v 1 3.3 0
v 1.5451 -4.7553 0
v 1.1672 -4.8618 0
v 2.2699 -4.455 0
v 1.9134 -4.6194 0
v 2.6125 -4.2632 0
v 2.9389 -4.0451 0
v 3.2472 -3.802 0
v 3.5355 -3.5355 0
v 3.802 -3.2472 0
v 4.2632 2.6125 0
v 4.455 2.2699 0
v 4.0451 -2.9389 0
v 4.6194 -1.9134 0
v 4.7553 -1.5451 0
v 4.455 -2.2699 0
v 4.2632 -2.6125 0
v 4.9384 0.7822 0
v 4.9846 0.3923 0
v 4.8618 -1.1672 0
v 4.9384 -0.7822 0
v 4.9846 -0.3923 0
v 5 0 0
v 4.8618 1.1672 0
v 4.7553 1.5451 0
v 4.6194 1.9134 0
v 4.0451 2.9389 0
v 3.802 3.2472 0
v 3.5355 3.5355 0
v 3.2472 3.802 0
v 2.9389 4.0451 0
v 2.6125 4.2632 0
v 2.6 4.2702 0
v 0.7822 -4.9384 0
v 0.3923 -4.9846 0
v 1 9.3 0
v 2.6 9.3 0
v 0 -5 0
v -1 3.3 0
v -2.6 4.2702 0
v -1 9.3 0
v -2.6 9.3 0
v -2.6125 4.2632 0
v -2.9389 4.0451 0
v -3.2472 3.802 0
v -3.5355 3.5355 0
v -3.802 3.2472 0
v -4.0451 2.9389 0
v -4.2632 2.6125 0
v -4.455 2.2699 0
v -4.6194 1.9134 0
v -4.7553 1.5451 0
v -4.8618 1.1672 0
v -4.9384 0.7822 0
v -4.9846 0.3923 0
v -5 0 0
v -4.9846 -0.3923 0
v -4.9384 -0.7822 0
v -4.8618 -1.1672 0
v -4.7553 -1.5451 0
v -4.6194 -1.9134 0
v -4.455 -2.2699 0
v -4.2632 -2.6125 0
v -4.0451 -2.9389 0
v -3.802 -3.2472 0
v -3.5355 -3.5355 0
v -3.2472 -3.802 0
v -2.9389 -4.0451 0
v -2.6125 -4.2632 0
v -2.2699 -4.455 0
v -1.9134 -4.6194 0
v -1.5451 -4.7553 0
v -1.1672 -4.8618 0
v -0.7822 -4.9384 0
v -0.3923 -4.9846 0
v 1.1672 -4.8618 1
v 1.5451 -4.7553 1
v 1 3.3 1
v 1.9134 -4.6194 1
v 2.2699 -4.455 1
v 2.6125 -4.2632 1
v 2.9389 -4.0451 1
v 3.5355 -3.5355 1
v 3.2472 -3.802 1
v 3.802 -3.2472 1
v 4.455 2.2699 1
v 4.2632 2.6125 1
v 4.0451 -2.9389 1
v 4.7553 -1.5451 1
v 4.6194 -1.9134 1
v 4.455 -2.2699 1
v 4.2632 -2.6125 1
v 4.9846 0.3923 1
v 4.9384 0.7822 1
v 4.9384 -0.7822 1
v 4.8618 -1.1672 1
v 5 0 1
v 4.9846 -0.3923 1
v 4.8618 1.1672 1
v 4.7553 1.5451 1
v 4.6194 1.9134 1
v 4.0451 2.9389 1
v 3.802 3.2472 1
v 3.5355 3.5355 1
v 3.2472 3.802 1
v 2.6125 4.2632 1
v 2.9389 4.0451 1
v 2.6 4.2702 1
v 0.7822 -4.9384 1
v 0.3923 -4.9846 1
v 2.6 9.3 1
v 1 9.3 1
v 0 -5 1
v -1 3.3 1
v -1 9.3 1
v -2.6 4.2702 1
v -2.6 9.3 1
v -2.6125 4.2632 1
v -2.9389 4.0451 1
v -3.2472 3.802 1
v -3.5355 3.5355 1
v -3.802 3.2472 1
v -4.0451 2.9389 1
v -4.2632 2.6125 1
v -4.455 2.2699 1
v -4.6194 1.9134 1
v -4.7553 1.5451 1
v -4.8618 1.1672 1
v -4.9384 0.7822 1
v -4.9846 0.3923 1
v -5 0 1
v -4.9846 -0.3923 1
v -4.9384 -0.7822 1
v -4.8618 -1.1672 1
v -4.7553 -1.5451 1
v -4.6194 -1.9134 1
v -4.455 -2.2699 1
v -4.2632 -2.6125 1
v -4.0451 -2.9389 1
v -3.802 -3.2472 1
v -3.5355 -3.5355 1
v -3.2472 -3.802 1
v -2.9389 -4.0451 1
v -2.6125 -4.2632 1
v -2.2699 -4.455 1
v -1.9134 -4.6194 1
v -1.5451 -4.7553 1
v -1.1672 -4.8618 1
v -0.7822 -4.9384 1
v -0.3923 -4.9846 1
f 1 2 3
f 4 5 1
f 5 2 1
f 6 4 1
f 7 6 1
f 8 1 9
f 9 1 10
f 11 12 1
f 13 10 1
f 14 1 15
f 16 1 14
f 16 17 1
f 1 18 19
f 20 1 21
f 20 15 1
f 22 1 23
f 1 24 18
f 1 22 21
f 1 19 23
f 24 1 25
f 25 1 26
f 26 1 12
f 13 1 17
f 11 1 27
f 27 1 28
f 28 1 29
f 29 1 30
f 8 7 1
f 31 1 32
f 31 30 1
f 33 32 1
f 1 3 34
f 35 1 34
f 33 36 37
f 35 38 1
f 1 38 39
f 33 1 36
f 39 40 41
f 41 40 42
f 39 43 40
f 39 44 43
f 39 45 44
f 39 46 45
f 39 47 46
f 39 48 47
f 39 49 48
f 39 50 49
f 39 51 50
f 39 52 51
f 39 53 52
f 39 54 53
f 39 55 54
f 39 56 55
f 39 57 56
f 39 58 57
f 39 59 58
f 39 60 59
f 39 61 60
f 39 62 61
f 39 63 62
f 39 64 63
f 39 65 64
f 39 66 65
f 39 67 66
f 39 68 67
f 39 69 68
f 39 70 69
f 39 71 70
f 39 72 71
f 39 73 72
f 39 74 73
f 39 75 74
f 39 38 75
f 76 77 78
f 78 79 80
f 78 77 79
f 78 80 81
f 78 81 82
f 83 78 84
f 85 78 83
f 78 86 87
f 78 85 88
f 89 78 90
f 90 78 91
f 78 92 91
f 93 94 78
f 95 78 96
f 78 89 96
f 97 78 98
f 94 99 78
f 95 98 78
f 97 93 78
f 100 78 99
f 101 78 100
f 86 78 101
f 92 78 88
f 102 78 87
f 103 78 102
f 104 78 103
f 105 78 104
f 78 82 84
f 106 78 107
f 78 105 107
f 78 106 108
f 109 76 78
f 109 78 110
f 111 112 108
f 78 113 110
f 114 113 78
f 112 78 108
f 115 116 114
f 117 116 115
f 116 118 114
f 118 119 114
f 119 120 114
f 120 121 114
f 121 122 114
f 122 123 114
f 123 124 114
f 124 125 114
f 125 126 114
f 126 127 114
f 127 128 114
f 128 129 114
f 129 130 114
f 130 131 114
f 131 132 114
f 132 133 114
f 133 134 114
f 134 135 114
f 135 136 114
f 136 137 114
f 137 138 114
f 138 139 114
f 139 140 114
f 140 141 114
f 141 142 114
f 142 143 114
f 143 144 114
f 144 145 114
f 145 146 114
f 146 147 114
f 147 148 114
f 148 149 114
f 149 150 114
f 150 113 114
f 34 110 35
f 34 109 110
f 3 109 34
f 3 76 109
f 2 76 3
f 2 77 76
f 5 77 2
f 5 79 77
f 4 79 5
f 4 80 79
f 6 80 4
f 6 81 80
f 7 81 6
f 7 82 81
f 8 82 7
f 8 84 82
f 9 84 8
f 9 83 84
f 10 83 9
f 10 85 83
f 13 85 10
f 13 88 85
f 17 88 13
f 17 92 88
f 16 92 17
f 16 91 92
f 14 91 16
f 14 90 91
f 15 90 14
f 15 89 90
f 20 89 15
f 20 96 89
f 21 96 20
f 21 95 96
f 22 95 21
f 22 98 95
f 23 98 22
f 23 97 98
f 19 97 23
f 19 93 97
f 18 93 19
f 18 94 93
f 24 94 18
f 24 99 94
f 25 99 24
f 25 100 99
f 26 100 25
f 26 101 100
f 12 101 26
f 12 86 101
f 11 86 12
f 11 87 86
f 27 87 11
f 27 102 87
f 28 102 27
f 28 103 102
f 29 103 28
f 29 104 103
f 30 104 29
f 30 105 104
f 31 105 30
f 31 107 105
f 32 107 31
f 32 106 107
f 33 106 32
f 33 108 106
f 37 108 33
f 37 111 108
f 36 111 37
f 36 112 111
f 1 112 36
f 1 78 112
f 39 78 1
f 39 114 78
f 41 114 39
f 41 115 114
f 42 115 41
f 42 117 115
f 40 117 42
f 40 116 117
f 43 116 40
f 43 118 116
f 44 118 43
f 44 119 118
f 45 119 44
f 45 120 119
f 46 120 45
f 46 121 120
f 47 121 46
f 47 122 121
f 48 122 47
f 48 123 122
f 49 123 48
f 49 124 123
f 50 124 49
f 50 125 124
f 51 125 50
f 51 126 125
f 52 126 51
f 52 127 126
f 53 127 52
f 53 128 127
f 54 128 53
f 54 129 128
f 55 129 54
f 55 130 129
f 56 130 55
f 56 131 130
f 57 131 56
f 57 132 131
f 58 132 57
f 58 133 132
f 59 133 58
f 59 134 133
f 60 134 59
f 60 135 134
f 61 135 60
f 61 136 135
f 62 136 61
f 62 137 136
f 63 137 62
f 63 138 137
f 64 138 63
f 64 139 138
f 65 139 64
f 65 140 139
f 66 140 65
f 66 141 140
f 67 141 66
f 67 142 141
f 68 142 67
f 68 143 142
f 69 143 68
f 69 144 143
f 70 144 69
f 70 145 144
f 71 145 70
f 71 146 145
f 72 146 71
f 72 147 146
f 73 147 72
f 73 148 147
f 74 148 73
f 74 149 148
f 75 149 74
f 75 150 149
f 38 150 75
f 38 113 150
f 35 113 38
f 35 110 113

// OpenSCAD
// part_id: cp-f3
// name: Fork 2W 4D 8L 7T
// source_drawing_ids: DRW-005
// units: mm
// revision: 0.1
// SPDX-License-Identifier: MIT

module cpf3_profile_2d() {
    difference() {
        union() {
            circle(r = 5.0, $fn = 80);
            translate([0, 5.3]) square([5.2, 8.0], center = true);
        }
        translate([0, 7.3]) square([2.0, 8.0], center = true);
    }
}

module part_cpf3(th = 1.0) {
    linear_extrude(height = th) cpf3_profile_2d();
}

// ---- "main guard" ----
// Default to previewing when opened directly:
if (is_undef(__LIB_MODE__)) {
    part_cpf3();
}
